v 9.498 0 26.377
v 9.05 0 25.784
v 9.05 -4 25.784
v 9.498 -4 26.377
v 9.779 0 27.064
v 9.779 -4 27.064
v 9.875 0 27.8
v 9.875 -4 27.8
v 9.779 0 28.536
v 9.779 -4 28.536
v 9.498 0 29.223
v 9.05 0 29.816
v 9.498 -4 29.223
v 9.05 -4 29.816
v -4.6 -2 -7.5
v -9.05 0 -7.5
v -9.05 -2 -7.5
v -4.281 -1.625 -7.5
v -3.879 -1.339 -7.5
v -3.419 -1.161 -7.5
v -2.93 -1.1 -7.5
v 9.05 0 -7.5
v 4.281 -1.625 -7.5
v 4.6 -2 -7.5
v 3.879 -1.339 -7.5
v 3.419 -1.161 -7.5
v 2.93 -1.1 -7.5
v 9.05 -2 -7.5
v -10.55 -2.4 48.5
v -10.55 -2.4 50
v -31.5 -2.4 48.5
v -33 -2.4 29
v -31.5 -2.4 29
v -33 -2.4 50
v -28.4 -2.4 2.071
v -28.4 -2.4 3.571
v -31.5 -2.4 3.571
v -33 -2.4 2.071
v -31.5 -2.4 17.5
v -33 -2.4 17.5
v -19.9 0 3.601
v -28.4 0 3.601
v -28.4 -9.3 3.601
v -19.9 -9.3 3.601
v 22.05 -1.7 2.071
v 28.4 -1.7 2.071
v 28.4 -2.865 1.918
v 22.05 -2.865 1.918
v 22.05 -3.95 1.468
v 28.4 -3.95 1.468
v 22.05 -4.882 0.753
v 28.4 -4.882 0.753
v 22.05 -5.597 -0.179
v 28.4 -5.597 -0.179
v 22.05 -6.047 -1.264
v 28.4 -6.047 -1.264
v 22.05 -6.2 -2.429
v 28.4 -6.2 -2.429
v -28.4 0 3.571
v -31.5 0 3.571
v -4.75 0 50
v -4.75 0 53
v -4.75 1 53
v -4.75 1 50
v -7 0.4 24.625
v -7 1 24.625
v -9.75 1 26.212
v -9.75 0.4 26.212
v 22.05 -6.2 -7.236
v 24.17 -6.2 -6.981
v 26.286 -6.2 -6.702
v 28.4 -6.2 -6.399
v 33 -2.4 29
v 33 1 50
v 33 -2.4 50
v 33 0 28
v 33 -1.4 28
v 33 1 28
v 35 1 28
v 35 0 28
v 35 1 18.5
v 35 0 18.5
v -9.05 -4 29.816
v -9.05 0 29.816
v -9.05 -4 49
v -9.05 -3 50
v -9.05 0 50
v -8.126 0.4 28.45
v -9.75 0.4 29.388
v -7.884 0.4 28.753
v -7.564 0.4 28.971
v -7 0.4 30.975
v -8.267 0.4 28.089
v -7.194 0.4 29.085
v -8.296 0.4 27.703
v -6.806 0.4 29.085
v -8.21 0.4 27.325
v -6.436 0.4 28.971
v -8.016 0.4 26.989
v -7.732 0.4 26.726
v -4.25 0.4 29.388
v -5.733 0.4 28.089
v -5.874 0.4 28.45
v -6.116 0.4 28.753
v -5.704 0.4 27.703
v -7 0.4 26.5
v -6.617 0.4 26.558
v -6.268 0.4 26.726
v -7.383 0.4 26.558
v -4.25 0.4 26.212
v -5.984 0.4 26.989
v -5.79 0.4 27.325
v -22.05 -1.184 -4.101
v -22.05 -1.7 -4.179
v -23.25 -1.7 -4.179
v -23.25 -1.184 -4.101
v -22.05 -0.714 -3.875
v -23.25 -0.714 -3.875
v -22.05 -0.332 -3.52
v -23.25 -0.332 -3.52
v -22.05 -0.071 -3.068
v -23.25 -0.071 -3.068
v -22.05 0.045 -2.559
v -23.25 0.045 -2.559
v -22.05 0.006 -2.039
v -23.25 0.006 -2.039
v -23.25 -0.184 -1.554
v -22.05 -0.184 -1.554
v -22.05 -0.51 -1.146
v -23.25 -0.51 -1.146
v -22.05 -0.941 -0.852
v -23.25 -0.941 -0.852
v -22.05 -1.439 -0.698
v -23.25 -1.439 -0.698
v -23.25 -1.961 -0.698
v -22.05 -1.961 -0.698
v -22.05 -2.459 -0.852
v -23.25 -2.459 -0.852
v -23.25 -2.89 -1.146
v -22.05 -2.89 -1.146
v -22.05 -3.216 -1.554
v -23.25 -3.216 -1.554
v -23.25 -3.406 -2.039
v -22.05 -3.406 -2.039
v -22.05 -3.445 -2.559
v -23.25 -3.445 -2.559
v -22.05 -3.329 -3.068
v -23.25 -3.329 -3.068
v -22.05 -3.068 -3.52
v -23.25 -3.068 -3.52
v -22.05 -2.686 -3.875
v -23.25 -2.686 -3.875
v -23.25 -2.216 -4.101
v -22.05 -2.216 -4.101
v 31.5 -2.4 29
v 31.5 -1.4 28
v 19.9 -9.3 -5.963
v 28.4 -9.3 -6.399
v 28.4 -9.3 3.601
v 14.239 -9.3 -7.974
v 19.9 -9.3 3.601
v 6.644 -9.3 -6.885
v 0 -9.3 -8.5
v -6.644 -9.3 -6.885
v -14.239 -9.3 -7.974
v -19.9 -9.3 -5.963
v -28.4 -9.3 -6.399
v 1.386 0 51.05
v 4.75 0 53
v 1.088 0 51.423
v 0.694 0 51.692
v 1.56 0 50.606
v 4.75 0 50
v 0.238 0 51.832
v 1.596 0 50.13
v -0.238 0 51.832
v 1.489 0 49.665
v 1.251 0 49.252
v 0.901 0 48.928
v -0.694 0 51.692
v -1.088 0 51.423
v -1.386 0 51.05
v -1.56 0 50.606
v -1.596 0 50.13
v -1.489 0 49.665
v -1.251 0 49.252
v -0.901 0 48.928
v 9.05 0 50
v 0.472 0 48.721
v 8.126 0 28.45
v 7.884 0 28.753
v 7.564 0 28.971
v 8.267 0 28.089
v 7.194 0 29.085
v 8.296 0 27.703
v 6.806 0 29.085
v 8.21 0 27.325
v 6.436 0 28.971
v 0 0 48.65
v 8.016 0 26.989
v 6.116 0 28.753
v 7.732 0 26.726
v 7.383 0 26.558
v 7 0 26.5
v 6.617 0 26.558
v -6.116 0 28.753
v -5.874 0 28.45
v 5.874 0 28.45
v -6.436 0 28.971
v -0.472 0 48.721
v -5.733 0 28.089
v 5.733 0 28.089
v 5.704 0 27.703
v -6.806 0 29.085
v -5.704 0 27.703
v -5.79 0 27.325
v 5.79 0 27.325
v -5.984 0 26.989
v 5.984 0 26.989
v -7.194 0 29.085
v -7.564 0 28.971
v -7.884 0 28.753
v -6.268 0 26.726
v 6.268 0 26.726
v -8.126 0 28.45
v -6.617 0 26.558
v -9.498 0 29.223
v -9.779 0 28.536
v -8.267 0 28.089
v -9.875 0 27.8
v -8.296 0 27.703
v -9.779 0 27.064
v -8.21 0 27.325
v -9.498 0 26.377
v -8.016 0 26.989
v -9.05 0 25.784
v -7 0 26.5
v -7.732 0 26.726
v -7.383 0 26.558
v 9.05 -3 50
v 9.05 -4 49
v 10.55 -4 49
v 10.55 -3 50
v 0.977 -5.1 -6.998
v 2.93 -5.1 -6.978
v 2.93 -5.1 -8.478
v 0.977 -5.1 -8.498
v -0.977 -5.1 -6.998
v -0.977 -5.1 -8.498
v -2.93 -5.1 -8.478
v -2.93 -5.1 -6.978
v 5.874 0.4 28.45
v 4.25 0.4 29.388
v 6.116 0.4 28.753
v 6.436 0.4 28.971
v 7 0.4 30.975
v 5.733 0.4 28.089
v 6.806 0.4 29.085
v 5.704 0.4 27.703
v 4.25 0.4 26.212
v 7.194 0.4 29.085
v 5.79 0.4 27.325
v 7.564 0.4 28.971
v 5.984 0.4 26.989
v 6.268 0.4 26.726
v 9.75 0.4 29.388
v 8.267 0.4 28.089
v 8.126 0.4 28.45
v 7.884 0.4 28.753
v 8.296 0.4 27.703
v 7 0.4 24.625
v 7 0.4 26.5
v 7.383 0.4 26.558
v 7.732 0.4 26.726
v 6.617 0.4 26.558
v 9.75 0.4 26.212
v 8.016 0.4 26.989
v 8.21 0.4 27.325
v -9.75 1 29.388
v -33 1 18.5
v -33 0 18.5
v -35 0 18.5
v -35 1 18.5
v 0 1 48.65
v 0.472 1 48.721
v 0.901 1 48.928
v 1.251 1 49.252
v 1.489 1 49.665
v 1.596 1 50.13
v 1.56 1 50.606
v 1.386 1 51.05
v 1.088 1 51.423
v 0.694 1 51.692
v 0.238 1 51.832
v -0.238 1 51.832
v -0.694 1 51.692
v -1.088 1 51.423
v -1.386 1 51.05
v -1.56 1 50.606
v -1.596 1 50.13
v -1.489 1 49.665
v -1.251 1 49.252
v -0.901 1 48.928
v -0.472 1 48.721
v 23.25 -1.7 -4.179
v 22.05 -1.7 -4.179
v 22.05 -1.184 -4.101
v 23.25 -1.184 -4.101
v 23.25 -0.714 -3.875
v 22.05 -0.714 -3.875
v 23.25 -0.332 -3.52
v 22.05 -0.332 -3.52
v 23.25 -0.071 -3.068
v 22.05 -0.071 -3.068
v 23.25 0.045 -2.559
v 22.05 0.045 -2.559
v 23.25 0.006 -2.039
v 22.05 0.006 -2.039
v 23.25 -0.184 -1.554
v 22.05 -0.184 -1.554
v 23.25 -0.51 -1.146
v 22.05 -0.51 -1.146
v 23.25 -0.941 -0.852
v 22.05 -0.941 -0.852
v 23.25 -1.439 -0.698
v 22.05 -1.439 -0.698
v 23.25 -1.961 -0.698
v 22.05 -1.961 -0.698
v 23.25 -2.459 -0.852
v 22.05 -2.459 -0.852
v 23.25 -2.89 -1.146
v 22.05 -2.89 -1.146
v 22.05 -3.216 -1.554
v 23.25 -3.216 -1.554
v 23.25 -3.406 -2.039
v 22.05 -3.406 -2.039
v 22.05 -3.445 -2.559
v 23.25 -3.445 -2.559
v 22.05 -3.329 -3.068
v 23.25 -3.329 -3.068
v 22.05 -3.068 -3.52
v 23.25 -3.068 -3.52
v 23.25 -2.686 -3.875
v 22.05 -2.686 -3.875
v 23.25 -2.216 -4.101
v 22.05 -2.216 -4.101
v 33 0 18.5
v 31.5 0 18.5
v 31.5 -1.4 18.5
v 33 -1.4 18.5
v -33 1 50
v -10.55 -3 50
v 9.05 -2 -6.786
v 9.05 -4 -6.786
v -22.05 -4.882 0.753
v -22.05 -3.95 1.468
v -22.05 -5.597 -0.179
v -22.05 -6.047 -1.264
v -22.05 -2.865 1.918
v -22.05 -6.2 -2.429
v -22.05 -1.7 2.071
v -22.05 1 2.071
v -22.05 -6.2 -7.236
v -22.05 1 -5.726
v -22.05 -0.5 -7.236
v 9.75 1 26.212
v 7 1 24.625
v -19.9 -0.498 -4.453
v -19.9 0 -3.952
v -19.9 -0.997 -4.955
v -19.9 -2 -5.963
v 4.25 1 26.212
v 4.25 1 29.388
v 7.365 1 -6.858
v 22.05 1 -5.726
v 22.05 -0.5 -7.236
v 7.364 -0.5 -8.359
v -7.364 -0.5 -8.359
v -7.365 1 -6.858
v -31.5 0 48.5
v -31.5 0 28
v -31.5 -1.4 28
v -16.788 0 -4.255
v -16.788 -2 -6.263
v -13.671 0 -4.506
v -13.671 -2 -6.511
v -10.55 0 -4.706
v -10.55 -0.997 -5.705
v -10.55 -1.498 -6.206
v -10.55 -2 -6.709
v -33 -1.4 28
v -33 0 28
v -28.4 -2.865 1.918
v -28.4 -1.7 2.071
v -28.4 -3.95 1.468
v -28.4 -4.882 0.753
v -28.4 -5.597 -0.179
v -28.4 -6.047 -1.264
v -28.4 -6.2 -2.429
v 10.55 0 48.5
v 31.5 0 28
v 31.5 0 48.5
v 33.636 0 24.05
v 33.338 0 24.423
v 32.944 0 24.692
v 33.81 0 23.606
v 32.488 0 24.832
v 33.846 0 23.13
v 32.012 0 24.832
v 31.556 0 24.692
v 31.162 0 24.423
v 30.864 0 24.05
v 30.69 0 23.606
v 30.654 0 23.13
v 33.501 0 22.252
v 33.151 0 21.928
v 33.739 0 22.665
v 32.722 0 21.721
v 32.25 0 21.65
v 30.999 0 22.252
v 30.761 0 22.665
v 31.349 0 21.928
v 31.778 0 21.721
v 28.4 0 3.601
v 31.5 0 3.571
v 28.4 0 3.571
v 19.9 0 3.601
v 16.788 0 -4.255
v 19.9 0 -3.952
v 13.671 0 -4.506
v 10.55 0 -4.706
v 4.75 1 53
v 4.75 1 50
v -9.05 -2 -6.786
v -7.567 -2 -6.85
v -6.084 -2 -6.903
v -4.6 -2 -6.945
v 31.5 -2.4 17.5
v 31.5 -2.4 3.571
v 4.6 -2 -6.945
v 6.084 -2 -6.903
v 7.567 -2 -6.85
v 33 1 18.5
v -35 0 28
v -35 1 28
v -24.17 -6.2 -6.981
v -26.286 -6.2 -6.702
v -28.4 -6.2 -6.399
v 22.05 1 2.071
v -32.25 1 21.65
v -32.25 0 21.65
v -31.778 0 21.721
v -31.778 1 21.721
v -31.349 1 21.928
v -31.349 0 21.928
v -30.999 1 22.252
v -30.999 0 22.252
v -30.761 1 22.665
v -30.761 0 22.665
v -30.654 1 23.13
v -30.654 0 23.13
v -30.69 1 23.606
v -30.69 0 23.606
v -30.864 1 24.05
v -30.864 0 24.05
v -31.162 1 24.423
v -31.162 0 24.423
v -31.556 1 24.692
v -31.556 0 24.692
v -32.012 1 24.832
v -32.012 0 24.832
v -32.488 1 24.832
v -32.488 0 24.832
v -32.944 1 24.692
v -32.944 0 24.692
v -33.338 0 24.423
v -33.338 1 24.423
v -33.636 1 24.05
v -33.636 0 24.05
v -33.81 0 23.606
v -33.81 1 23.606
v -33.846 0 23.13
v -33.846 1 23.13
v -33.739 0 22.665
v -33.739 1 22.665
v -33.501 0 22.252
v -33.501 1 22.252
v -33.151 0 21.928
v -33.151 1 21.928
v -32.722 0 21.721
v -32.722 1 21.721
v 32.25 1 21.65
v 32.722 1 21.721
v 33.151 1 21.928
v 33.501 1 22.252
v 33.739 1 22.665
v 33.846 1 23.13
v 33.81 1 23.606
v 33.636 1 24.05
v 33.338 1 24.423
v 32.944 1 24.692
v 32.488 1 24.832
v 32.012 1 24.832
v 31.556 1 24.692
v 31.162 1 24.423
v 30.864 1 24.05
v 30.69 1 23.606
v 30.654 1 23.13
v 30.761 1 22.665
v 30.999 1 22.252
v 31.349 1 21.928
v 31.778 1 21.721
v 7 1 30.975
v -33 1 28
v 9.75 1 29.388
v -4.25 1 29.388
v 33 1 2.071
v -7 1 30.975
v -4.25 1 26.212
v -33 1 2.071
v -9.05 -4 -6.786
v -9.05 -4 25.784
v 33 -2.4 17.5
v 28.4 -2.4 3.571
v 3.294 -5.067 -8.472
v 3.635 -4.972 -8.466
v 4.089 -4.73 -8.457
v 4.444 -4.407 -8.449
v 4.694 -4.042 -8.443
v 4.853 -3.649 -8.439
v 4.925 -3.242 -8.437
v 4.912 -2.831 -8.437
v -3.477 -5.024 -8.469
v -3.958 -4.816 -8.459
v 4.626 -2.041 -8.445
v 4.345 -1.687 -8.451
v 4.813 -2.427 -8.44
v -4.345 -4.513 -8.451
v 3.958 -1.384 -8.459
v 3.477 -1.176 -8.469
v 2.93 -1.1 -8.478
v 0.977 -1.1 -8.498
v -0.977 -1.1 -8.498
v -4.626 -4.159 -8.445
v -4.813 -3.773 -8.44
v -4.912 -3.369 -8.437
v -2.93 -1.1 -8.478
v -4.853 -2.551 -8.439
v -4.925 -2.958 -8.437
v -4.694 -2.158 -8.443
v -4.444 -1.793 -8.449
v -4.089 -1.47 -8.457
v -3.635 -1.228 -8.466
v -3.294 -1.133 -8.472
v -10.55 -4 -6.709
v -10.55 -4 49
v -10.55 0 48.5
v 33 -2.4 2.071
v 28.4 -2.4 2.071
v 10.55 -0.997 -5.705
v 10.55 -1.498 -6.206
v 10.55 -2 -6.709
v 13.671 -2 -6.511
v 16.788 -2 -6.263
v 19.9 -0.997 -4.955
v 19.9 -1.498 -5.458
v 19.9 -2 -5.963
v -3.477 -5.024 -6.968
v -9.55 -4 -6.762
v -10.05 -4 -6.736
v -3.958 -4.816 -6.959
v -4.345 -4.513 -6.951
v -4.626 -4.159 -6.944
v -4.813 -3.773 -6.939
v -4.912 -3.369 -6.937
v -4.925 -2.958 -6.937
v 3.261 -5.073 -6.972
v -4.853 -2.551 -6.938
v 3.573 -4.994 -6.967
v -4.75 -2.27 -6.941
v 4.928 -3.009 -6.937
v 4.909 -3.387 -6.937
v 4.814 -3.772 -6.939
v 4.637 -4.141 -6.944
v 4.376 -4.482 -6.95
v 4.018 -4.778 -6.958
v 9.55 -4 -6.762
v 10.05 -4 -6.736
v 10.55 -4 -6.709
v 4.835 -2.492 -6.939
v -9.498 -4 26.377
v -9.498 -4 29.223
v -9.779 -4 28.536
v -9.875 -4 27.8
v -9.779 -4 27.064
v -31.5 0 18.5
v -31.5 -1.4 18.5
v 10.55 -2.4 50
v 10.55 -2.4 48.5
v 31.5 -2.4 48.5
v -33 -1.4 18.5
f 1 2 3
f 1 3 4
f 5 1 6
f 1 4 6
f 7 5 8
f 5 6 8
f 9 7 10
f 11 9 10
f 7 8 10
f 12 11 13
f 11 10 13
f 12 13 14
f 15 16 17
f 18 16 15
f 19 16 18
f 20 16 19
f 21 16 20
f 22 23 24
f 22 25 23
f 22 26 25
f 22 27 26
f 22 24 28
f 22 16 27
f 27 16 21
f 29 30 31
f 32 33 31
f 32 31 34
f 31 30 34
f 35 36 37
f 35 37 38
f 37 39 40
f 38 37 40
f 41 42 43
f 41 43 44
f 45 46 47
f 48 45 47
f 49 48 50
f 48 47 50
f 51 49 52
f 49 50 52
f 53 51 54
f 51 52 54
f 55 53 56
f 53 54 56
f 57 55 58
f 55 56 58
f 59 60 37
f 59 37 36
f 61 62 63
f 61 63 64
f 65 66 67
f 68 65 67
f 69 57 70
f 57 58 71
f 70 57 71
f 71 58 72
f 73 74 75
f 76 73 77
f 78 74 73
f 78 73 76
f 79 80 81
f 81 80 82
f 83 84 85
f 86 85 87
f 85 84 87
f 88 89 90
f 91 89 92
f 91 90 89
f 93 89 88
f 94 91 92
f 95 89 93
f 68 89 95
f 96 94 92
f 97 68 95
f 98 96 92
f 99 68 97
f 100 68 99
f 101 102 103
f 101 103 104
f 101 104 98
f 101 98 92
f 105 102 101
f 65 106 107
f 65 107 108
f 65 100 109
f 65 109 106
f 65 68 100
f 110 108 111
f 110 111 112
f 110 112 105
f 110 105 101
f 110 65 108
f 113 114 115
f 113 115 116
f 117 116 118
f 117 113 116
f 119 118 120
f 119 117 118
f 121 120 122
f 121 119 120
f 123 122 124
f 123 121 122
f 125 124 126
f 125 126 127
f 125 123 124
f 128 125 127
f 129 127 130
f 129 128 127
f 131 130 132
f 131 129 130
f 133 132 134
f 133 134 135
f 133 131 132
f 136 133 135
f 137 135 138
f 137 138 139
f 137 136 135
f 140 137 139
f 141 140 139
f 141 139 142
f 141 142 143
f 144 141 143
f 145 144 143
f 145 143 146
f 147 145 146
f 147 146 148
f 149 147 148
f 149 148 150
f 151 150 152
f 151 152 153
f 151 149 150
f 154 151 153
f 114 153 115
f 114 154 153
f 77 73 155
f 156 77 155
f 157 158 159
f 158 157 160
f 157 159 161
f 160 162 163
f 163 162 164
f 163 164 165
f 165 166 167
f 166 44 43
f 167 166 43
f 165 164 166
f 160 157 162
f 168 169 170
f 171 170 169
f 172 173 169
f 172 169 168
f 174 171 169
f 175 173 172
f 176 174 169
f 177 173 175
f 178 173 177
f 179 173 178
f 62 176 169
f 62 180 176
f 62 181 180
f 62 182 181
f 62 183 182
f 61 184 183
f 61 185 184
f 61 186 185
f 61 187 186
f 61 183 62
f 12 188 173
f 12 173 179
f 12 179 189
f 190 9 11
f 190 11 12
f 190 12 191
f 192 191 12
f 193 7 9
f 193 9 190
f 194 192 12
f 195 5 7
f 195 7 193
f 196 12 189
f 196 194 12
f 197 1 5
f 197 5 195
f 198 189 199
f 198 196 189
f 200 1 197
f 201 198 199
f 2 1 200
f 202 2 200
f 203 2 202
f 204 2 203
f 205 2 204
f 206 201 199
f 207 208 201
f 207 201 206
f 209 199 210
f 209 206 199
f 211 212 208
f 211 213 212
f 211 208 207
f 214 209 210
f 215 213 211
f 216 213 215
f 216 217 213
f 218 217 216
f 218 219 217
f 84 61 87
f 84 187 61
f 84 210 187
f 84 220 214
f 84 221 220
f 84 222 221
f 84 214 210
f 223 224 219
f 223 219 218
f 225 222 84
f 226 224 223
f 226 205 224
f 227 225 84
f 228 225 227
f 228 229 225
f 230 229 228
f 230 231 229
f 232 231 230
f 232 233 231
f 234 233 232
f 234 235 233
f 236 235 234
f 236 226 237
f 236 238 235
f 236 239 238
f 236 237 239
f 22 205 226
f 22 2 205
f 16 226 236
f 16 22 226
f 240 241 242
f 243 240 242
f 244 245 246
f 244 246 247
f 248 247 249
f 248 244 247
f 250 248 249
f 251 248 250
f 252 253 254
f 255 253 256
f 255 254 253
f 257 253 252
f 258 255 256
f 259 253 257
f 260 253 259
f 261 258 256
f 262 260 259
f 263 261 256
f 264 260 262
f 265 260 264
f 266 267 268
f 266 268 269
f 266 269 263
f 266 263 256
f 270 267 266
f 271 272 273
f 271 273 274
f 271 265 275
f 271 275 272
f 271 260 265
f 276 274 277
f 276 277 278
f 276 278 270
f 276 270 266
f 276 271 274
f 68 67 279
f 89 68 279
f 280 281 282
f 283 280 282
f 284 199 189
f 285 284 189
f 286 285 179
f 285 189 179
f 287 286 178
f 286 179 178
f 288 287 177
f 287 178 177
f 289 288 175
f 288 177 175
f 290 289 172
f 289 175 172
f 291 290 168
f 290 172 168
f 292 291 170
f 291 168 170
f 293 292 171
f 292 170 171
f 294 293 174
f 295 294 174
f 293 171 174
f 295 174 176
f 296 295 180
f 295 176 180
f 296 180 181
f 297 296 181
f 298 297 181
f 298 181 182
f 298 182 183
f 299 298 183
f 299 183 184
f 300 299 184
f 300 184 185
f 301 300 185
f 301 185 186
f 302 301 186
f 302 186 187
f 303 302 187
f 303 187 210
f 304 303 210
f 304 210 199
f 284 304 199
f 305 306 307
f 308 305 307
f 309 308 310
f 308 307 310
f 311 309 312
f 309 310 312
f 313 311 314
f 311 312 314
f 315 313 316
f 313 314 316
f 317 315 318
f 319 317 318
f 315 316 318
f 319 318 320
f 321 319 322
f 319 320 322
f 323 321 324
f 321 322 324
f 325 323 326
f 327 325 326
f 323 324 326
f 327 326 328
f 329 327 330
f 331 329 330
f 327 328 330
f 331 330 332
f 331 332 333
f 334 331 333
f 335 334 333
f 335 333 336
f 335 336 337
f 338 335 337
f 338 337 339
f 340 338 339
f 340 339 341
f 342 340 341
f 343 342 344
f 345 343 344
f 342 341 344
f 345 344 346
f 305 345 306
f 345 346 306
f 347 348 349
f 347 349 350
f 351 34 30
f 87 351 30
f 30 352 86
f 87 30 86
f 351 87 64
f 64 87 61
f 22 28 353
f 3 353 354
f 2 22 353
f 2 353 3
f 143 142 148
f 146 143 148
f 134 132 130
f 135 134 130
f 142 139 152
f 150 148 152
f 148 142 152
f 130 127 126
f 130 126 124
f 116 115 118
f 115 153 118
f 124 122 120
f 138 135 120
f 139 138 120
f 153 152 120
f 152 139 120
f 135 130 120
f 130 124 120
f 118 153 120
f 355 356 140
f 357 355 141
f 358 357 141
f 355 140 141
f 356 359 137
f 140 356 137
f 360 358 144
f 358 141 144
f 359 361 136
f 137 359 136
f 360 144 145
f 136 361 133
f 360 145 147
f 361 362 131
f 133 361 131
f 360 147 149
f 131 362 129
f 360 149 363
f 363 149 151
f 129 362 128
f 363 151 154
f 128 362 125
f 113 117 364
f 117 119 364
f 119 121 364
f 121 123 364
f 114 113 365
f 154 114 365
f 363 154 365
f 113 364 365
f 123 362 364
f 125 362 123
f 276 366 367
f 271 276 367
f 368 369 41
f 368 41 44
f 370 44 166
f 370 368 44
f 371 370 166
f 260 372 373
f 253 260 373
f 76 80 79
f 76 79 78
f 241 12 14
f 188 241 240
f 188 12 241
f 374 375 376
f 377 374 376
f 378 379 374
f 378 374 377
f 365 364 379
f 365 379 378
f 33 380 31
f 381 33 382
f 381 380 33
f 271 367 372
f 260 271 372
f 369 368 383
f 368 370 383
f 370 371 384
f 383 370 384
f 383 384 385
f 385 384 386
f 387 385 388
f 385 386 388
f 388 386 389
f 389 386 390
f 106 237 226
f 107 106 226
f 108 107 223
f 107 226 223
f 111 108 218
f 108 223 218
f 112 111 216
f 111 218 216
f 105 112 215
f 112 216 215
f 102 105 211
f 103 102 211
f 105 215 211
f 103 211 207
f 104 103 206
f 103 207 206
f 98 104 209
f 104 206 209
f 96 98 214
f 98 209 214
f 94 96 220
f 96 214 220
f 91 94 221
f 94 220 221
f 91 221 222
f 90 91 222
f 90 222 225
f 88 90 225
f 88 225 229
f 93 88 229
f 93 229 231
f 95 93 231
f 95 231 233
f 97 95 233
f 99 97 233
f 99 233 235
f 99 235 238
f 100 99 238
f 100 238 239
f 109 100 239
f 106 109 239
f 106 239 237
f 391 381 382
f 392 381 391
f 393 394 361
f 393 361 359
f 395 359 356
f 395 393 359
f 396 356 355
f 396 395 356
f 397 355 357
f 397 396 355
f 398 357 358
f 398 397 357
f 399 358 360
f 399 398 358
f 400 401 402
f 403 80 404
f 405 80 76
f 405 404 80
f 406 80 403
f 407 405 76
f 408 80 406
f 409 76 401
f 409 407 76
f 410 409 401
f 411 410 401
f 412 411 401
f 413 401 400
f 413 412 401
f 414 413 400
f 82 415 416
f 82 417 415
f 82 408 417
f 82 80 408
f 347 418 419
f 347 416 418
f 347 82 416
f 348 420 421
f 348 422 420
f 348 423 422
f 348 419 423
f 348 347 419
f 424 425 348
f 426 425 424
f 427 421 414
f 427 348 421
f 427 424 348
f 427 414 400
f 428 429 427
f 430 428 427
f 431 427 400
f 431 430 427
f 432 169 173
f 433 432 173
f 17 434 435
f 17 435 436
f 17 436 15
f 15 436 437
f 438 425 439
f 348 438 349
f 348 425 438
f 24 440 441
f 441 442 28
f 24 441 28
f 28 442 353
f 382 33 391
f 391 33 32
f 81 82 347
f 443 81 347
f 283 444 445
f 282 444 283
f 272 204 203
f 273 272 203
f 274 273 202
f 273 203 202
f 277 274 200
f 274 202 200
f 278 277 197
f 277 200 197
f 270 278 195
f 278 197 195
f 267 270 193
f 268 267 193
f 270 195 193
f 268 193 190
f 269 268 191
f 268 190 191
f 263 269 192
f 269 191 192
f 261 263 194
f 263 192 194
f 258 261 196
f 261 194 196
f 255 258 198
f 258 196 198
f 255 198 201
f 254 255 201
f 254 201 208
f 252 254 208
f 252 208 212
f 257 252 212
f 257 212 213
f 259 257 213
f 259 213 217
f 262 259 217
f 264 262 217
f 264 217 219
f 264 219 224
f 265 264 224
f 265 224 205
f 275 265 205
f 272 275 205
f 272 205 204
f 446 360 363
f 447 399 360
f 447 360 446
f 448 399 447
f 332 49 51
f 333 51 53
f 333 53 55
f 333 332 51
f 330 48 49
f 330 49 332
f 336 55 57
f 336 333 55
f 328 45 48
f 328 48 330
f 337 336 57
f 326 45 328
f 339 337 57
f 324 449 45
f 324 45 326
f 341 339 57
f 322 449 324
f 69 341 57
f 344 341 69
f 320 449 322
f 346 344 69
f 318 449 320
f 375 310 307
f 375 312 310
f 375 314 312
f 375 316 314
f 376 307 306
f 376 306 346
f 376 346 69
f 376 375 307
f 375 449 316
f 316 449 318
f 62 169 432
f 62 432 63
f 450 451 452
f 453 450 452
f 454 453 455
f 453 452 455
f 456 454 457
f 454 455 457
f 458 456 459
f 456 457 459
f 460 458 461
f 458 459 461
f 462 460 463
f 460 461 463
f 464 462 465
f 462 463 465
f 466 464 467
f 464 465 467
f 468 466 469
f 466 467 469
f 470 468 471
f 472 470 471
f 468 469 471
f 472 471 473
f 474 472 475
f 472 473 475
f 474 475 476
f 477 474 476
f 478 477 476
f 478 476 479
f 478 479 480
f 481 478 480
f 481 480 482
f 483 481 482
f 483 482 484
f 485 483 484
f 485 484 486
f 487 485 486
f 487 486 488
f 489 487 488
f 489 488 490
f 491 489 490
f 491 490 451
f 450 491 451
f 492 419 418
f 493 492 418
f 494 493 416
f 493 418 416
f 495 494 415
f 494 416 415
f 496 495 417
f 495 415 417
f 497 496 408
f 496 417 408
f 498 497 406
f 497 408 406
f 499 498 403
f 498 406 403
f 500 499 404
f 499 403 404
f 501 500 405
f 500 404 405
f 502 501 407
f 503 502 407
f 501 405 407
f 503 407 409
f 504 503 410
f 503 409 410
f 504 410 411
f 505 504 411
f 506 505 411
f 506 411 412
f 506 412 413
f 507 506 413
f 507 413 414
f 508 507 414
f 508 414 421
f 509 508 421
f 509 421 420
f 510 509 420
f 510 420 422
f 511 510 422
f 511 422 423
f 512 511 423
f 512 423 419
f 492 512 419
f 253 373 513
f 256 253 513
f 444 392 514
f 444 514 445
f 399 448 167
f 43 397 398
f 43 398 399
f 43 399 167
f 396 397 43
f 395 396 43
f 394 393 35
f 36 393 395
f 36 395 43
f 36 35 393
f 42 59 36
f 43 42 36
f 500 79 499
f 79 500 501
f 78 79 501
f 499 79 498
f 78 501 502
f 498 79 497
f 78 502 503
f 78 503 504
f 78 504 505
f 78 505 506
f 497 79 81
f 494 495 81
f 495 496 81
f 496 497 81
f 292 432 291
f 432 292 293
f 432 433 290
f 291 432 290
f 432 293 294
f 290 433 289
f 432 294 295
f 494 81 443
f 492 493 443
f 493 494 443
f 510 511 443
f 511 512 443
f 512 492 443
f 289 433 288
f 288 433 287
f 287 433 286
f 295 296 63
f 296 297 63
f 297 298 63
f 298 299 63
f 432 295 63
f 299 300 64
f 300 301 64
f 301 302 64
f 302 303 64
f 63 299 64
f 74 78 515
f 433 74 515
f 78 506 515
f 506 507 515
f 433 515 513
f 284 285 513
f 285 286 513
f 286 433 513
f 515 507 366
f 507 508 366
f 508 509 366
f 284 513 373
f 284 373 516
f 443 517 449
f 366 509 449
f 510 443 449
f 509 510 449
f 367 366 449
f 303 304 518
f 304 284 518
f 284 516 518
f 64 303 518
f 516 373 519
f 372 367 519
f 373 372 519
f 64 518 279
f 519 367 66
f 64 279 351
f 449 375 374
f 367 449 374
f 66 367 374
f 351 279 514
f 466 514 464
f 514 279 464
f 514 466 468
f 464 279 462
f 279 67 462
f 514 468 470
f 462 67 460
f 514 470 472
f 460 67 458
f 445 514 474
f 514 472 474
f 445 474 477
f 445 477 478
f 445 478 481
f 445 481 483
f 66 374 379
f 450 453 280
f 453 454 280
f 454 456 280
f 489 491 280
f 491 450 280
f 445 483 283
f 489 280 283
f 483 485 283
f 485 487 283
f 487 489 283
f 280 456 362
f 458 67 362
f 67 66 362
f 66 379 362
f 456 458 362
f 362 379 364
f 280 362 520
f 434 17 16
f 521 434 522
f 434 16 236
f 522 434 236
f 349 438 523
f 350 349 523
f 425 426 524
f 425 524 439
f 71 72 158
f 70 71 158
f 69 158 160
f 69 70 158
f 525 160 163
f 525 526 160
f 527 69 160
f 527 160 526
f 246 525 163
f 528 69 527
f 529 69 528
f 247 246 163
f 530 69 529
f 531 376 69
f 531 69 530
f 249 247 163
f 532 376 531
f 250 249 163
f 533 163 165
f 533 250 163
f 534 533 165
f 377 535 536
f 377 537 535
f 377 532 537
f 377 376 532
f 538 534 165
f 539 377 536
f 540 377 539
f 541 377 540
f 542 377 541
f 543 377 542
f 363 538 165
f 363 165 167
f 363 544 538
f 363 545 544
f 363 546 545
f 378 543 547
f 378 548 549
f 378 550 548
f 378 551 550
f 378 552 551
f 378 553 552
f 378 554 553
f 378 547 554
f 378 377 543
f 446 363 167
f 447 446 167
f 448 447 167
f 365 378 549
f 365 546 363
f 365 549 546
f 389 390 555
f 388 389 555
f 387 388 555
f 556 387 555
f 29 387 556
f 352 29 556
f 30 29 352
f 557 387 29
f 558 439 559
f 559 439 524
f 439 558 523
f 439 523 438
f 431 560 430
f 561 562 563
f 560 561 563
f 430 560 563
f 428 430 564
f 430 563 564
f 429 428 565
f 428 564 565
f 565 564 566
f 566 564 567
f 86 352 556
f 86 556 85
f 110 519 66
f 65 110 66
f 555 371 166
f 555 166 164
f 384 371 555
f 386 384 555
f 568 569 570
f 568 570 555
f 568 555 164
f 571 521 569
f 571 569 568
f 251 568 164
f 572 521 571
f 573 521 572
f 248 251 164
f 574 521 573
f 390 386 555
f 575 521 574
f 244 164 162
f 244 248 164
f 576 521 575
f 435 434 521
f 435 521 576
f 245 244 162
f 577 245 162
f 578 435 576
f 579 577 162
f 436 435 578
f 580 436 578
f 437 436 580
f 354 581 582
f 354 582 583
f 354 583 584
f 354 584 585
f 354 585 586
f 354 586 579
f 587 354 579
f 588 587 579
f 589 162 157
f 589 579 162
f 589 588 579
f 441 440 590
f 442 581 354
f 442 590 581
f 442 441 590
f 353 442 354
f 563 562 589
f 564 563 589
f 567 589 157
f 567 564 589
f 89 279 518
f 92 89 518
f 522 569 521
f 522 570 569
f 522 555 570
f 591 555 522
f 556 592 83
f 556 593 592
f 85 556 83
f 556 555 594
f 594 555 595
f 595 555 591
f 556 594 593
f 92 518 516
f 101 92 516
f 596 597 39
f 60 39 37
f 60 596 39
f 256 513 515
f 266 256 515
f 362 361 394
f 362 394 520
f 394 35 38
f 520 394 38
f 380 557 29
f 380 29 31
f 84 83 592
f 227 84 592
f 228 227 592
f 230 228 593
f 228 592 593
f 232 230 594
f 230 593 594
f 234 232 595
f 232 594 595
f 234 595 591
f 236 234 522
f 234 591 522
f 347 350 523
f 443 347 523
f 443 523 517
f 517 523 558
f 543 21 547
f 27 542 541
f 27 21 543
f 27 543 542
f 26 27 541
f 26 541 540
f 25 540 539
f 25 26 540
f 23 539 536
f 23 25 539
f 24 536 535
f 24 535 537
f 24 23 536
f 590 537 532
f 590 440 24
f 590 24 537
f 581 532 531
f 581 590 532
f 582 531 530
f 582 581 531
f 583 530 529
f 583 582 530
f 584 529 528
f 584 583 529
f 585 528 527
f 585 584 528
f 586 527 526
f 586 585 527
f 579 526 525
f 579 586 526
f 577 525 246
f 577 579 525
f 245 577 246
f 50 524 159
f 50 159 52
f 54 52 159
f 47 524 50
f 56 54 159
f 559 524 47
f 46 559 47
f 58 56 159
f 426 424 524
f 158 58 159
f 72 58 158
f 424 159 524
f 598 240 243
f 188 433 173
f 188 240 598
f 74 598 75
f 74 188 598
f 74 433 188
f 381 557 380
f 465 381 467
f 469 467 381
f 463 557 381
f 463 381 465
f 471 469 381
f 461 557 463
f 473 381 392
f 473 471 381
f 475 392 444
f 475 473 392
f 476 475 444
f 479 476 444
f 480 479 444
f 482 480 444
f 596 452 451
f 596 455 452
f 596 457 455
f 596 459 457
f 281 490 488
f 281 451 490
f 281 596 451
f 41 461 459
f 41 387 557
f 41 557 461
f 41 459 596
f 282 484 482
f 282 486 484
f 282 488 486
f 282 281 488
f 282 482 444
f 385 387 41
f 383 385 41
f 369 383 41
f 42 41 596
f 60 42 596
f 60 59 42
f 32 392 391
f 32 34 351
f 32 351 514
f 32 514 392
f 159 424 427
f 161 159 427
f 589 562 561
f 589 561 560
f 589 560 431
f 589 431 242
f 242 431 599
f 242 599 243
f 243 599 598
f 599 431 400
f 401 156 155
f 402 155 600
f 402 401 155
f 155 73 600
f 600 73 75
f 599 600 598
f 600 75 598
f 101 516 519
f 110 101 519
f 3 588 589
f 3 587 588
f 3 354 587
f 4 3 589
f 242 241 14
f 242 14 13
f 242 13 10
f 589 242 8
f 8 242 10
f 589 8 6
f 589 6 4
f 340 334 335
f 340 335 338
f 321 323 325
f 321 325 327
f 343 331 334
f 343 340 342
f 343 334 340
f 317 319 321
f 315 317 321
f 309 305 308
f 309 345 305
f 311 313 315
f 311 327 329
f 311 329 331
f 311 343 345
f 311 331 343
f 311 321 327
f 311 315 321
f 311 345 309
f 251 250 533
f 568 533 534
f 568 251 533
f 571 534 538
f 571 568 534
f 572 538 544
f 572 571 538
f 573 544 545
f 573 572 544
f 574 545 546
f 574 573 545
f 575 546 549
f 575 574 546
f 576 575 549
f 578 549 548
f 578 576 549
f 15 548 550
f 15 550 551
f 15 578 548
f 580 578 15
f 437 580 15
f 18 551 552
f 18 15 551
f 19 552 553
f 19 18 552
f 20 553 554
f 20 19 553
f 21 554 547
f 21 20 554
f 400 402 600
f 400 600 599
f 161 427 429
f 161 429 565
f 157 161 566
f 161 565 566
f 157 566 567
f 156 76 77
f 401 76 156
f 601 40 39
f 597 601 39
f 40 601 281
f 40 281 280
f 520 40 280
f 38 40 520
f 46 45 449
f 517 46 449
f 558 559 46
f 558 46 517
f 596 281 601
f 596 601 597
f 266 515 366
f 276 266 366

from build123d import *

# Parameters (mm, degrees)
SKETCH1_W            = 66
SKETCH1_H            = 100
BOSS_EXTRUDE1_DEPTH  = 1
CUT_EXTRUDE1_START   = -1
CUT_EXTRUDE1_DEPTH   = 1
CUT_EXTRUDE2_DEPTH   = 60.916608716
SKETCH4_W            = 70
SKETCH4_H            = 9.5
SKETCH4_W_2          = 9.5
SKETCH4_H_2          = 3
BOSS_EXTRUDE2_DEPTH  = 1
SKETCH5_R            = 1.6
CUT_EXTRUDE3_DEPTH   = 64.521649853
BOSS_EXTRUDE3_DEPTH  = 9.3
SKETCH7_W            = 18.1
SKETCH7_H            = 37.25
CUT_EXTRUDE4_DEPTH   = 2
SKETCH8_W            = 0.75
SKETCH8_H            = 35
BOSS_EXTRUDE4_DEPTH  = 1.9
SKETCH10_W           = 19.6
SKETCH10_H           = 14.249078429
CUT_EXTRUDE5_DEPTH   = 1.9
CUT_EXTRUDE6_DEPTH   = 65.191042989
BOSS_EXTRUDE7_START  = -9.3
BOSS_EXTRUDE7_DEPTH  = 9.3
BOSS_EXTRUDE8_START  = -9.3
BOSS_EXTRUDE8_DEPTH  = 9.3
CUT_EXTRUDE7_DEPTH   = 6.35
SKETCH18_R           = 1.75
BOSS_EXTRUDE9_DEPTH  = 1.2
CHAMFER1_SIZE        = 2
CHAMFER1_SIZE_2      = 1.753861884
CHAMFER2_SIZE        = 1.5
CHAMFER3_SIZE        = 2
CUT_EXTRUDE8_DEPTH   = 1
SKETCH20_W           = 1.5
SKETCH20_H           = 56.786035821
BOSS_EXTRUDE10_DEPTH = 4
BOSS_EXTRUDE11_DEPTH = 2.4
CHAMFER4_SIZE        = 1
SKETCH22_R           = 1.3
CUT_EXTRUDE9_DEPTH   = 1
SKETCH23_R           = 2.875
CUT_EXTRUDE10_DEPTH  = 4
CUT_EXTRUDE11_DEPTH  = 0.6


with BuildPart() as part:
    # Sketch1 → Boss-Extrude1 (new body)
    with BuildSketch(Plane(origin=(0, 0, 0), x_dir=(1, 0, 0), z_dir=(0, 1, 0))):
        Rectangle(SKETCH1_W, SKETCH1_H)
    extrude(amount=BOSS_EXTRUDE1_DEPTH)

    # Cut-Extrude1: read off the stored shape, not the designer's step
    # Cut-Extrude1 outline → Cut-Extrude1 (cut)
    with BuildSketch(Plane.XZ.offset(CUT_EXTRUDE1_START)):
        with BuildLine():
            ThreePointArc((33, 0.434794163), (30.75228798, 0.045949397), (28.5, -0.315448488))
            Line((28.5, -0.315448488), (28.5, -6.384127156))
            ThreePointArc((28.5, -6.384127156), (0, -8.5), (-28.5, -6.384127156))
            Line((-28.5, -6.384127156), (-28.5, -0.315448488))
            ThreePointArc((-28.5, -0.315448488), (-30.75228798, 0.045949397), (-33, 0.434794163))
            Line((-33, 0.434794163), (-33, -50))
            Line((-33, -50), (33, -50))
            Line((33, -50), (33, 0.434794163))
        make_face()
    extrude(amount=CUT_EXTRUDE1_DEPTH, mode=Mode.SUBTRACT)

    # Sketch3 → Cut-Extrude2 (cut, through all)
    with BuildSketch(Plane.XZ):
        with BuildLine():
            Line((-28.5, -0.315448488), (-28.5, -6.384127156))
            ThreePointArc((-28.5, -6.384127156), (-28.450000976, -6.391585578), (-28.4, -6.399030904))
            Line((-28.4, -6.399030904), (-28.4, -0.229667352))
            ThreePointArc((-28.4, -0.229667352), (-30.702389333, 0.139013646), (-33, 0.536389468))
            Line((-33, 0.536389468), (-33, 0.434794163))
            ThreePointArc((-33, 0.434794163), (-30.75228798, 0.045949397), (-28.5, -0.315448488))
        make_face()
        with BuildLine():
            Line((33, 0.536389468), (33, 0.434794163))
            ThreePointArc((33, 0.434794163), (30.75228798, 0.045949397), (28.5, -0.315448488))
            Line((28.5, -0.315448488), (28.5, -6.384127156))
            ThreePointArc((28.5, -6.384127156), (28.450000976, -6.391585578), (28.4, -6.399030904))
            Line((28.4, -6.399030904), (28.4, -0.229667352))
            ThreePointArc((28.4, -0.229667352), (30.702389333, 0.139013646), (33, 0.536389468))
        make_face()
    extrude(amount=-CUT_EXTRUDE2_DEPTH, mode=Mode.SUBTRACT)

    # Sketch4 → Boss-Extrude2 (add)
    with BuildSketch(Plane(origin=(0, 0, 0), x_dir=(-1, 0, 0), z_dir=(0, -1, 0))):
        with Locations((0, -23.25)):
            Rectangle(SKETCH4_W, SKETCH4_H)
        with Locations((0, -51.5)):
            Rectangle(SKETCH4_W_2, SKETCH4_H_2)
    extrude(amount=-BOSS_EXTRUDE2_DEPTH)

    # Sketch5 → Cut-Extrude3 (cut, through all)
    with BuildSketch(Plane.XZ):
        with Locations(Location((32.25, 23.25, 0), (0, 0, 270))):
            Circle(SKETCH5_R)
        with Locations(Location((-32.25, 23.25, 0), (0, 0, 270))):
            Circle(SKETCH5_R)
        with Locations(Location((0, 50.25, 0), (0, 0, 270))):
            Circle(SKETCH5_R)
    extrude(amount=-CUT_EXTRUDE3_DEPTH, mode=Mode.SUBTRACT)

    # Sketch6 → Boss-Extrude3 (add)
    with BuildSketch(Plane.XZ):
        with BuildLine():
            Line((28.4, -4.882390945), (28.4, -6.399030904))
            ThreePointArc((28.4, -6.399030904), (0, -8.5), (-28.4, -6.399030904))
            Line((-28.4, -6.399030904), (-28.4, -4.882390945))
            ThreePointArc((-28.4, -4.882390945), (0, -7), (28.4, -4.882390945))
        make_face()
    extrude(amount=BOSS_EXTRUDE3_DEPTH)

    # Sketch7 → Cut-Extrude4 (cut)
    with BuildSketch(Plane.XZ):
        with Locations((0, 11.125)):
            Rectangle(SKETCH7_W, SKETCH7_H)
    extrude(amount=CUT_EXTRUDE4_DEPTH, mode=Mode.SUBTRACT)

    # Sketch8 → Boss-Extrude4 (add)
    with BuildSketch(Plane.XZ):
        with Locations((-9.425, 10)):
            Rectangle(SKETCH8_W, SKETCH8_H)
        with Locations((9.425, 10)):
            Rectangle(SKETCH8_W, SKETCH8_H)
    extrude(amount=BOSS_EXTRUDE4_DEPTH)

    # Sketch10 → Cut-Extrude5 (cut)
    with BuildSketch(Plane.XZ):
        with Locations((0, 10.375460785)):
            Rectangle(SKETCH10_W, SKETCH10_H)
    extrude(amount=CUT_EXTRUDE5_DEPTH, mode=Mode.SUBTRACT)

    # Sketch12 → Cut-Extrude6 (cut, through all)
    with BuildSketch(Plane.XY):
        with BuildLine():
            Line((-2.93, -1.1), (2.93, -1.1))
            ThreePointArc((2.93, -1.1), (4.93, -3.1), (2.93, -5.1))
            Line((2.93, -5.1), (-2.93, -5.1))
            ThreePointArc((-2.93, -5.1), (-4.93, -3.1), (-2.93, -1.1))
        make_face()
    extrude(amount=-CUT_EXTRUDE6_DEPTH, mode=Mode.SUBTRACT)

    # Sketch14 → Boss-Extrude7 (add)
    with BuildSketch(Plane.XZ.offset(9.3).offset(BOSS_EXTRUDE7_START)):
        with BuildLine():
            Line((-28.4, -6.399030904), (-28.4, -0.229667352))
            Line((-28.4, -0.229667352), (-27.4, -0.229667352))
            Line((-27.4, -0.229667352), (-27.4, -6.545125559))
            ThreePointArc((-27.4, -6.545125559), (-27.900095626, -6.472732776), (-28.4, -6.399030904))
        make_face()
    boss_extrude7 = extrude(amount=BOSS_EXTRUDE7_DEPTH)

    # Mirror1: Boss-Extrude7 across plane
    add(boss_extrude7.mirror(Plane(origin=(0, 0, 0), x_dir=(0, 0, 1), z_dir=(1, 0, 0))))

    # Sketch16 → Boss-Extrude8 (add)
    with BuildSketch(Plane.XZ.offset(9.3).offset(BOSS_EXTRUDE8_START)):
        with BuildLine():
            Line((28.4, -6.399030904), (28.4, 3.600969096))
            Line((28.4, 3.600969096), (19.9, 3.600969096))
            Line((19.9, 3.600969096), (19.9, -7.471325984))
            ThreePointArc((19.9, -7.471325984), (24.155950699, -6.982349176), (28.4, -6.399030904))
        make_face()
    boss_extrude8 = extrude(amount=BOSS_EXTRUDE8_DEPTH)

    # Sketch17 → Cut-Extrude7 (cut)
    with BuildSketch(Plane(origin=(28.4, 0, 0), x_dir=(0, 0, -1), z_dir=(1, 0, 0))):
        with BuildLine():
            Line((2.428677783, -6.2), (8.5, -6.2))
            Line((8.5, -6.2), (8.5, 1))
            Line((8.5, 1), (-2.071322217, 1))
            Line((-2.071322217, 1), (-2.071322217, -1.7))
            ThreePointArc((-2.071322217, -1.7), (-0.753302732, -4.881980515), (2.428677783, -6.2))
        make_face()
    cut_extrude7 = extrude(amount=-CUT_EXTRUDE7_DEPTH, mode=Mode.SUBTRACT)

    # Sketch18 → Boss-Extrude9 (add)
    with BuildSketch(Plane(origin=(22.05, 0, 0), x_dir=(0, 0, -1), z_dir=(1, 0, 0))):
        with Locations((2.428677783, -1.7)):
            Circle(SKETCH18_R)
    boss_extrude9 = extrude(amount=BOSS_EXTRUDE9_DEPTH)

    # Mirror5: Boss-Extrude8, Cut-Extrude7, Boss-Extrude9 across plane
    add(boss_extrude8.mirror(Plane(origin=(0, 0, 0), x_dir=(0, 0, 1), z_dir=(1, 0, 0))))
    add(cut_extrude7.mirror(Plane(origin=(0, 0, 0), x_dir=(0, 0, 1), z_dir=(1, 0, 0))), mode=Mode.SUBTRACT)
    add(boss_extrude9.mirror(Plane(origin=(0, 0, 0), x_dir=(0, 0, 1), z_dir=(1, 0, 0))))

    # Chamfer1
    # the kernel refuses this chamfer: 2, 1.753861884 mm, written as the material it takes off along each edge
    with BuildSketch(Plane(origin=(-28.4, -5.143365976, -0.229667352), x_dir=(0, 0, 1), z_dir=(0, 1, 0))) as chamfer1_piece_1:
        with BuildLine():
            Line((CHAMFER1_SIZE, 0), (0.273671674, -1.726328326))
            ThreePointArc((0.273671674, -1.726328326), (0.138499154, -0.886697037), (0, 0))
            Line((0, 0), (CHAMFER1_SIZE, 0))
        make_face()
    extrude(amount=11.286731952, mode=Mode.SUBTRACT)
    with BuildSketch(Plane(origin=(28.4, -5.116242352, -0.229667352), x_dir=(0.987565010261834, 0, 0.1572111653367653), z_dir=(0, 1, 0))) as chamfer1_piece_2:
        with BuildLine():
            Line((1.989439971, 0), (CHAMFER1_SIZE_2 * 0.157211165371, -CHAMFER1_SIZE_2 * 0.987565010478))
            Line((CHAMFER1_SIZE_2 * 0.157211165371, -CHAMFER1_SIZE_2 * 0.987565010478), (0, 0))
            ThreePointArc((0, 0), (1.02284944, 0.002644953), (1.989439971, 0))
        make_face()
    extrude(amount=11.232484704, mode=Mode.SUBTRACT)

    # Chamfer2
    chamfer2_edges = [part.edges().sort_by_distance(p)[0] for p in [
        (0, 1, -8.5),
    ]]
    chamfer(chamfer2_edges, length=CHAMFER2_SIZE)

    # Chamfer3
    # the kernel refuses this chamfer: 2 mm, written as the material it adds along each edge
    with BuildSketch(Plane(origin=(0, 0, 184.5), x_dir=(-0.1305886688100571, 0, -0.9914366341720571), z_dir=(-0.9914366341720571, 0, 0.1305886688100571))) as chamfer3_piece_1_section:
        Polygon((191.5 - CHAMFER3_SIZE, 0), (191.5, CHAMFER3_SIZE), (191.5, 0), align=None)
    chamfer3_piece_1 = revolve(axis=Axis((0, 0, 184.5), (0, -1, 0)), revolution_arc=6.10908985, mode=Mode.PRIVATE)
    chamfer3_piece_1 = split(chamfer3_piece_1, bisect_by=Plane(origin=(-9.8, 0, 184.5), z_dir=(-1, 0, 0)), keep=Keep.TOP, mode=Mode.PRIVATE)
    chamfer3_piece_1 = split(chamfer3_piece_1, bisect_by=Plane(origin=(-19.9, 0, 184.5), z_dir=(1, 0, 0)), keep=Keep.TOP, mode=Mode.PRIVATE)
    chamfer3_piece_1 = split(chamfer3_piece_1, bisect_by=Plane(origin=(0, -2, 184.5), z_dir=(0, 1, 0)), keep=Keep.TOP, mode=Mode.PRIVATE)
    add(chamfer3_piece_1)
    with BuildSketch(Plane(origin=(0, 0, 184.5), x_dir=(-0.1305886688100571, 0, -0.9914366341720571), z_dir=(-0.9914366341720571, 0, 0.1305886688100571))) as chamfer3_piece_2_section:
        Polygon((191.5 - CHAMFER3_SIZE, 0), (191.5, CHAMFER3_SIZE), (191.5, 0), align=None)
    chamfer3_piece_2 = revolve(axis=Axis((0, 0, 184.5), (0, -1, 0)), revolution_arc=6.10908985, mode=Mode.PRIVATE)
    chamfer3_piece_2 = split(chamfer3_piece_2, bisect_by=Plane(origin=(-9.8, 0, 184.5), z_dir=(1, 0, 0)), keep=Keep.TOP, mode=Mode.PRIVATE)
    chamfer3_piece_2 = split(chamfer3_piece_2, bisect_by=Plane(origin=(-9.05, 0, 184.5), z_dir=(-1, 0, 0)), keep=Keep.TOP, mode=Mode.PRIVATE)
    chamfer3_piece_2 = split(chamfer3_piece_2, bisect_by=Plane(origin=(0, -2, 184.5), z_dir=(0, 1, 0)), keep=Keep.TOP, mode=Mode.PRIVATE)
    add(chamfer3_piece_2)
    with BuildSketch(Plane(origin=(0, 0, 184.5), x_dir=(0.0243365747300663, 0, -0.9997038217044125), z_dir=(-0.9997038217044125, 0, -0.0243365747300663))) as chamfer3_piece_3_section:
        Polygon((191.5 - CHAMFER3_SIZE, 0), (191.5, CHAMFER3_SIZE), (191.5, 0), align=None)
    chamfer3_piece_3 = revolve(axis=Axis((0, 0, 184.5), (0, -1, 0)), revolution_arc=6.10908985, mode=Mode.PRIVATE)
    chamfer3_piece_3 = split(chamfer3_piece_3, bisect_by=Plane(origin=(9.8, 0, 184.5), z_dir=(-1, 0, 0)), keep=Keep.TOP, mode=Mode.PRIVATE)
    chamfer3_piece_3 = split(chamfer3_piece_3, bisect_by=Plane(origin=(0, -2, 184.5), z_dir=(0, 1, 0)), keep=Keep.TOP, mode=Mode.PRIVATE)
    chamfer3_piece_3 = split(chamfer3_piece_3, bisect_by=Plane(origin=(9.05, 0, 184.5), z_dir=(1, 0, 0)), keep=Keep.TOP, mode=Mode.PRIVATE)
    add(chamfer3_piece_3)
    with BuildSketch(Plane(origin=(0, 0, 184.5), x_dir=(0.0243365747300663, 0, -0.9997038217044125), z_dir=(-0.9997038217044125, 0, -0.0243365747300663))) as chamfer3_piece_4_section:
        Polygon((191.5 - CHAMFER3_SIZE, 0), (191.5, CHAMFER3_SIZE), (191.5, 0), align=None)
    chamfer3_piece_4 = revolve(axis=Axis((0, 0, 184.5), (0, -1, 0)), revolution_arc=6.10908985, mode=Mode.PRIVATE)
    chamfer3_piece_4 = split(chamfer3_piece_4, bisect_by=Plane(origin=(19.9, 0, 184.5), z_dir=(-1, 0, 0)), keep=Keep.TOP, mode=Mode.PRIVATE)
    chamfer3_piece_4 = split(chamfer3_piece_4, bisect_by=Plane(origin=(9.8, 0, 184.5), z_dir=(1, 0, 0)), keep=Keep.TOP, mode=Mode.PRIVATE)
    chamfer3_piece_4 = split(chamfer3_piece_4, bisect_by=Plane(origin=(0, -2, 184.5), z_dir=(0, 1, 0)), keep=Keep.TOP, mode=Mode.PRIVATE)
    add(chamfer3_piece_4)

    # Sketch19 → Cut-Extrude8 (cut)
    with BuildSketch(Plane.XZ):
        with BuildLine():
            Line((-28.4, 2.071322217), (-33, 2.071322217))
            Line((-33, 2.071322217), (-33, 0.536389468))
            ThreePointArc((-33, 0.536389468), (-31.564124299, 0.284593323), (-30.126328326, 0.044004322))
            Line((-30.126328326, 0.044004322), (-28.4, 1.770332648))
            Line((-28.4, 1.770332648), (-28.4, 2.071322217))
        make_face()
        with BuildLine():
            Line((33, 2.071322217), (33, 0.536389468))
            ThreePointArc((33, 0.536389468), (31.68316133, 0.305029145), (30.364701305, 0.083094824))
            Line((30.364701305, 0.083094824), (28.4, 1.524194532))
            Line((28.4, 1.524194532), (28.4, 2.071322217))
            Line((28.4, 2.071322217), (33, 2.071322217))
        make_face()
    extrude(amount=-CUT_EXTRUDE8_DEPTH, mode=Mode.SUBTRACT)

    # Sketch20 → Boss-Extrude10 (add)
    with BuildSketch(Plane.XZ):
        with Locations((-9.8, 21.60698209)):
            Rectangle(SKETCH20_W, SKETCH20_H)
        with Locations((9.8, 21.60698209)):
            Rectangle(SKETCH20_W, SKETCH20_H)
    extrude(amount=BOSS_EXTRUDE10_DEPTH)

    # Sketch21 → Boss-Extrude11 (add)
    with BuildSketch(Plane.XZ):
        Polygon((33, 50), (33, 28), (31.5, 28), (31.5, 48.5), (10.55, 48.5), (10.55, 50), align=None)
        Polygon((-33, 28), (-33, 50), (-10.55, 50), (-10.55, 48.5), (-31.5, 48.5), (-31.5, 28), align=None)
        Polygon((33, 18.5), (33, 2.071322217), (28.4, 2.071322217), (28.4, 3.571322217), (31.5, 3.571322217), (31.5, 18.5), align=None)
        Polygon((-28.4, 2.071322217), (-33, 2.071322217), (-33, 18.5), (-31.5, 18.5), (-31.5, 3.571322217), (-28.4, 3.571322217), align=None)
    extrude(amount=BOSS_EXTRUDE11_DEPTH)

    # Chamfer4
    chamfer4_edges = [part.edges().sort_by_distance(p)[0] for p in [
        (-9.8, -4, 50),
        (9.8, -4, 50),
        (32.25, -2.4, 28),
        (-32.25, -2.4, 28),
        (32.25, -2.4, 18.5),
        (-32.25, -2.4, 18.5),
    ]]
    chamfer(chamfer4_edges, length=CHAMFER4_SIZE)

    # Sketch22 → Cut-Extrude9 (cut)
    with BuildSketch(Plane.XZ):
        with Locations(Location((-7, 27.8, 0), (0, 0, 270))):
            Circle(SKETCH22_R)
        with Locations(Location((7, 27.8, 0), (0, 0, 270))):
            Circle(SKETCH22_R)
    extrude(amount=-CUT_EXTRUDE9_DEPTH, mode=Mode.SUBTRACT)

    # Sketch23 → Cut-Extrude10 (cut)
    with BuildSketch(Plane.XZ.offset(4)):
        with Locations((-7, 27.8)):
            Circle(SKETCH23_R)
        with Locations((7, 27.8)):
            Circle(SKETCH23_R)
    extrude(amount=-CUT_EXTRUDE10_DEPTH, mode=Mode.SUBTRACT)

    # Sketch24 → Cut-Extrude11 (cut)
    with BuildSketch(Plane(origin=(0, 1, 0), x_dir=(1, 0, 0), z_dir=(0, 1, 0))):
        Polygon((-9.75, -26.21228676), (-9.75, -29.38771324), (-7, -30.975426481), (-4.25, -29.38771324), (-4.25, -26.21228676), (-7, -24.624573519), align=None)
        Polygon((7, -24.624573519), (4.25, -26.21228676), (4.25, -29.38771324), (7, -30.975426481), (9.75, -29.38771324), (9.75, -26.21228676), align=None)
    extrude(amount=-CUT_EXTRUDE11_DEPTH, mode=Mode.SUBTRACT)


solid = part.part
